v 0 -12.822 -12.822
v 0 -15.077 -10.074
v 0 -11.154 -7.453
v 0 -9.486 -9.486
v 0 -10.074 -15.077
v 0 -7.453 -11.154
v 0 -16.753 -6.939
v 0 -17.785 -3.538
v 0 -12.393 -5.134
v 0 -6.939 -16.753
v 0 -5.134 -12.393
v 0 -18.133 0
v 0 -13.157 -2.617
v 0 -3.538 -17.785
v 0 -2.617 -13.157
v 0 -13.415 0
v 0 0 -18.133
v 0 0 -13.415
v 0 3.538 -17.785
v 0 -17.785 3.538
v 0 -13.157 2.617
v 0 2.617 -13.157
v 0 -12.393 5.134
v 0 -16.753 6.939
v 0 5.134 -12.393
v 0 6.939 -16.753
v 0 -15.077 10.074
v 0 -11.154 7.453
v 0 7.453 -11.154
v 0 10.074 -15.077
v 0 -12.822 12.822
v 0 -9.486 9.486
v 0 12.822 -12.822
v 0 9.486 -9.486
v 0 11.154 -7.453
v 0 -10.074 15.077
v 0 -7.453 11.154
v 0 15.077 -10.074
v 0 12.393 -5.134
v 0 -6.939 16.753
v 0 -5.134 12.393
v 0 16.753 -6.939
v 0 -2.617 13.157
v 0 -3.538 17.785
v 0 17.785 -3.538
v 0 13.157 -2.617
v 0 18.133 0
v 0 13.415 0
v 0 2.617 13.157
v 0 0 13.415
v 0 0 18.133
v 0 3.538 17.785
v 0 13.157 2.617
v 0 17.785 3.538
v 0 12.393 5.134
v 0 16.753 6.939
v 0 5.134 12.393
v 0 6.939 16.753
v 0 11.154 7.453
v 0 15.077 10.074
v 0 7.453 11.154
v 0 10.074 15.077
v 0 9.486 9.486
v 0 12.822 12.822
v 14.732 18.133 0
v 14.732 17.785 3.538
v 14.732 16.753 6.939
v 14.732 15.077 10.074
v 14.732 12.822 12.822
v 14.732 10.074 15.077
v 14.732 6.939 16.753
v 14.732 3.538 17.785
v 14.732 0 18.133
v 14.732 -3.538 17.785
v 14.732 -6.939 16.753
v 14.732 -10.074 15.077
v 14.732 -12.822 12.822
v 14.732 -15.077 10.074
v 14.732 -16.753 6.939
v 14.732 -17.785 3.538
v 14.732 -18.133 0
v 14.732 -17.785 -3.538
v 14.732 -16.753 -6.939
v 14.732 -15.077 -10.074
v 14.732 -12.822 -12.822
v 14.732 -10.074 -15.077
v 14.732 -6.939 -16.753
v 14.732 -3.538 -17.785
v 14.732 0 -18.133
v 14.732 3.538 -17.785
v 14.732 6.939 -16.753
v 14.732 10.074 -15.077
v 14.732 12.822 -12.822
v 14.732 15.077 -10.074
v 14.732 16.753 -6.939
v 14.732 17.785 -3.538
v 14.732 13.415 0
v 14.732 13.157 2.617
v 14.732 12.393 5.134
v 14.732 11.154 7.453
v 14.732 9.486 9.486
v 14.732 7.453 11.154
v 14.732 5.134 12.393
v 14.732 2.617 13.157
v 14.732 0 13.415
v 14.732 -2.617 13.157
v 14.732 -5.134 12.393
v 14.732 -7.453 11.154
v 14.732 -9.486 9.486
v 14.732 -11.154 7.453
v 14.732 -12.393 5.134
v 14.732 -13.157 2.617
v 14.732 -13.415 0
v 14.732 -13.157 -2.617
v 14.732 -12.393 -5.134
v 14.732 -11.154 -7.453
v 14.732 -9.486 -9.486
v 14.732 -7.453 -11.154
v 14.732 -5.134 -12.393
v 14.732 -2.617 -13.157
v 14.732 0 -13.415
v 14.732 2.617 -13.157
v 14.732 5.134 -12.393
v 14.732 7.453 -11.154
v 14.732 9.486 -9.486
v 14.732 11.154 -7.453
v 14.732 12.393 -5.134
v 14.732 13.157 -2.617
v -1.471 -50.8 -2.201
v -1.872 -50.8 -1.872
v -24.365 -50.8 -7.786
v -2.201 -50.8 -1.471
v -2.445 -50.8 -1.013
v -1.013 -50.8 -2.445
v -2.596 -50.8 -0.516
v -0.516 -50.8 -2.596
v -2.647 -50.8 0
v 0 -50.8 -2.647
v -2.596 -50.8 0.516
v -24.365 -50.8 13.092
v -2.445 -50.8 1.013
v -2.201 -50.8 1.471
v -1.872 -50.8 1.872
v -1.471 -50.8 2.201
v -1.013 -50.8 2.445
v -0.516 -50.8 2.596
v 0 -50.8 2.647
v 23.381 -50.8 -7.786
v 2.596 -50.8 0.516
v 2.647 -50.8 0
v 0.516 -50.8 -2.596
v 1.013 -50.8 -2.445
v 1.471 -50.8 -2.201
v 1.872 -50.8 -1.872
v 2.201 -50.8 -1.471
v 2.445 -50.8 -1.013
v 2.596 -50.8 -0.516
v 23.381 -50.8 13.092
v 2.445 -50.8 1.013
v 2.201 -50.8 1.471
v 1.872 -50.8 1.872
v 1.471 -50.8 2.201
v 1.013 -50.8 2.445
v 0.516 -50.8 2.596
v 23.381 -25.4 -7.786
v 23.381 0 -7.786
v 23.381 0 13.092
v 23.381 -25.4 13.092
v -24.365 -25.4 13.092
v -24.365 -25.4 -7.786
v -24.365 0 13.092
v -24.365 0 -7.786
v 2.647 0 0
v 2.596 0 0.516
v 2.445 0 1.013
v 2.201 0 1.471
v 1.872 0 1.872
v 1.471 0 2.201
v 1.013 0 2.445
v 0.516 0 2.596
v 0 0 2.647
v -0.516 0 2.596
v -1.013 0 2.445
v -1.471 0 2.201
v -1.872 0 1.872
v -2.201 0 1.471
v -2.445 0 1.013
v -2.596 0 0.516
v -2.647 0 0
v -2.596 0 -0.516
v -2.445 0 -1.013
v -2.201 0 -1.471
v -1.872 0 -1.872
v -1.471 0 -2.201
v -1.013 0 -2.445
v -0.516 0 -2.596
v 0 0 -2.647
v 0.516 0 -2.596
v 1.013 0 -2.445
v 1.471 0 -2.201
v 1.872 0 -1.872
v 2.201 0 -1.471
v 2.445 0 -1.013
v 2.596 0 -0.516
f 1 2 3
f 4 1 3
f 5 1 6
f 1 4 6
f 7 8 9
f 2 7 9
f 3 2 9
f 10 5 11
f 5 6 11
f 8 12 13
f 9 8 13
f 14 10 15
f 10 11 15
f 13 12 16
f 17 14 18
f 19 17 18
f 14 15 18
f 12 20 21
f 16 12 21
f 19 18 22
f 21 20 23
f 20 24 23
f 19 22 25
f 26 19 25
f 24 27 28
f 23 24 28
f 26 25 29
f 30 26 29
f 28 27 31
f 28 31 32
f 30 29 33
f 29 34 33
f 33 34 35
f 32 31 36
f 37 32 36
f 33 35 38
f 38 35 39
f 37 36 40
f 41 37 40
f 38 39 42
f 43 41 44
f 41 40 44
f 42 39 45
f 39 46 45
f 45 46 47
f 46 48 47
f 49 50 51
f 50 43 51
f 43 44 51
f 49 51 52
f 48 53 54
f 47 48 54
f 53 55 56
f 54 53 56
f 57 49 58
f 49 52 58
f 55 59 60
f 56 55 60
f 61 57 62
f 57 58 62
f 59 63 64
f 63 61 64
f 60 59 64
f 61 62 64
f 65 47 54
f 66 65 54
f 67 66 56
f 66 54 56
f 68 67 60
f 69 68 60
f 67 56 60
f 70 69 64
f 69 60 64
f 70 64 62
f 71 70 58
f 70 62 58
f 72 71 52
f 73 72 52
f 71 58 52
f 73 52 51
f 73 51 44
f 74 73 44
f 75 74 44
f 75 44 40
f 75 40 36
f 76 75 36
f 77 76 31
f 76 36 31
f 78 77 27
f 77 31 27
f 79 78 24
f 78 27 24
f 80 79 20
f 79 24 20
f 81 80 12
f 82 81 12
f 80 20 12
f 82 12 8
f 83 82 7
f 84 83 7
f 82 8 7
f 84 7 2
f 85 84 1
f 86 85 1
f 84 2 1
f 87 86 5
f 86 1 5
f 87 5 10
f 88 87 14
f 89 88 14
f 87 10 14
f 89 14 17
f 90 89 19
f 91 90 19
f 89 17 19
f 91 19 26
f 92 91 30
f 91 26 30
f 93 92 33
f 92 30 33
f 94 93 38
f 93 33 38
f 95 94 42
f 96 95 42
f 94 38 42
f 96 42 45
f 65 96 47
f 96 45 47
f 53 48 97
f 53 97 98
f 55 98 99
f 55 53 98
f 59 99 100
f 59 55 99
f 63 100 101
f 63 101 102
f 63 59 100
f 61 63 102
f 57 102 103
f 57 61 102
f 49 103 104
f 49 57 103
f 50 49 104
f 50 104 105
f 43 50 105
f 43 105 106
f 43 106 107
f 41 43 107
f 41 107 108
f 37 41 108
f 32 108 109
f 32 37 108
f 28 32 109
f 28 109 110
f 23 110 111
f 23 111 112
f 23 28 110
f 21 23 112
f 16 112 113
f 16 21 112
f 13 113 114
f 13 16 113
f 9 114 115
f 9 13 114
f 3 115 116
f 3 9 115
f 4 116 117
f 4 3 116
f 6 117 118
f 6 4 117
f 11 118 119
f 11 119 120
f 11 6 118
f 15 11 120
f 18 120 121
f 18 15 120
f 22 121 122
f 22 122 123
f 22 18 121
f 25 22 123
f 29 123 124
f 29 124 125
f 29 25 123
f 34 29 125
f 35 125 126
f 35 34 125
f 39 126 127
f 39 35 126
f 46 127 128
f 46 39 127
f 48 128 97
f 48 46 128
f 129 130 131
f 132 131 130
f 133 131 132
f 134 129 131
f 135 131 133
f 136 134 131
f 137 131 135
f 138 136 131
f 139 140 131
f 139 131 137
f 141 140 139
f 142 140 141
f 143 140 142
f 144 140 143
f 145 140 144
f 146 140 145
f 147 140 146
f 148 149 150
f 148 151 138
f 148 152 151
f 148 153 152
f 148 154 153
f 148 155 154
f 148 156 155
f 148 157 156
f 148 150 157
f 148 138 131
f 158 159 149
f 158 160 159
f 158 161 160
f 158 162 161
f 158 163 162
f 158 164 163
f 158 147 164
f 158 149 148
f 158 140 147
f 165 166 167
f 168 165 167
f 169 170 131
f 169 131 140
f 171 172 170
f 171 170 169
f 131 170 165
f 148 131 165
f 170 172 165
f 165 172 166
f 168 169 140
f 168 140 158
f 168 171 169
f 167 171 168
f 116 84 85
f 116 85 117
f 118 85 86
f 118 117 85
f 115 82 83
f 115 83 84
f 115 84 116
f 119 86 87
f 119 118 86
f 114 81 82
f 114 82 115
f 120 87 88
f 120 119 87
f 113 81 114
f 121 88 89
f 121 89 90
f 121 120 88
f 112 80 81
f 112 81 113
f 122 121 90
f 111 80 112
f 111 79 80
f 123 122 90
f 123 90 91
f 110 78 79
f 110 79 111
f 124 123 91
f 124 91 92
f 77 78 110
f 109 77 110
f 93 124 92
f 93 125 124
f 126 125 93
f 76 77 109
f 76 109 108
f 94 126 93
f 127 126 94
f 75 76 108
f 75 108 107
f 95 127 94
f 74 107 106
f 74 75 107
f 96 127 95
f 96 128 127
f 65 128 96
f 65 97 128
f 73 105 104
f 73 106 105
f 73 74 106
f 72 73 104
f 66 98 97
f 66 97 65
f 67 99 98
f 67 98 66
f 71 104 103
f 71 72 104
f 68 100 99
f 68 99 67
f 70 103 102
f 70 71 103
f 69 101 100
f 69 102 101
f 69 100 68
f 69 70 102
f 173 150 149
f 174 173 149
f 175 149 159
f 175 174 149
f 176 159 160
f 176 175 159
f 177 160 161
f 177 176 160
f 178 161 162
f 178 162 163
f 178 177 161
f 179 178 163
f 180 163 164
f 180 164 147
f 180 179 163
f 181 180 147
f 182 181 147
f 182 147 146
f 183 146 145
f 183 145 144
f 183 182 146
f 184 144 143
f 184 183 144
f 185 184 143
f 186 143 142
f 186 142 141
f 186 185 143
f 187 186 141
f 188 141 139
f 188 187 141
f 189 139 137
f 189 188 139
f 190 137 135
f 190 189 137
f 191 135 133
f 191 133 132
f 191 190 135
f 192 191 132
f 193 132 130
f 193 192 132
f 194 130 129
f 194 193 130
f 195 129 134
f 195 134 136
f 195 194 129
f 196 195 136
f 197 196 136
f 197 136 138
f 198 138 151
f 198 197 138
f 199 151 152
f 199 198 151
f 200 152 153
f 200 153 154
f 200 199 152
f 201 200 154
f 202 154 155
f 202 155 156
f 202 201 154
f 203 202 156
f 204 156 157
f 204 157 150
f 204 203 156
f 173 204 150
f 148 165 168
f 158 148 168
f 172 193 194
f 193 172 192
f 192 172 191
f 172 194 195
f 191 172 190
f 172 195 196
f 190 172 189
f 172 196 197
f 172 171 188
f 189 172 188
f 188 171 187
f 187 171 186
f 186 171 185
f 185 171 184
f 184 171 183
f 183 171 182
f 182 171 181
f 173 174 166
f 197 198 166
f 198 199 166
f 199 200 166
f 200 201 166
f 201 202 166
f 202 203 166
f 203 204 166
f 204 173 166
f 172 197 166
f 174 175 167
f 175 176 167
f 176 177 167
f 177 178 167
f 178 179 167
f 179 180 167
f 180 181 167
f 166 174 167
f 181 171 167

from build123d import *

# Parameters (mm, degrees)
F0_R      = 18.132989
F0_R_2    = 13.414617
F1_DEPTH  = 14.732
F2_W      = 47.745362
F2_H      = 20.8779
F2_R      = 2.646886
F3_DEPTH  = 25.4
F3_FACE_W = 47.745362
F3_FACE_H = 20.8779
F3_FACE_R = 2.646886
F4_DEPTH  = 25.4


with BuildPart() as f1:
    # F0 (on Right) → F1 (new body)
    with BuildSketch(Plane.YZ):
        Circle(F0_R)
        Circle(F0_R_2, mode=Mode.SUBTRACT)
    extrude(amount=F1_DEPTH)


with BuildPart() as f3:
    # F2 (on Front) → F3 (new body)
    with BuildSketch(Plane.XZ):
        with Locations((-0.491887, 2.652683)):
            Rectangle(F2_W, F2_H)
        Circle(F2_R, mode=Mode.SUBTRACT)
    extrude(amount=F3_DEPTH)

    # F3_face (on face) → F4 (join)
    with BuildSketch(Plane(origin=(-0.502994, -25.4, 2.712577), x_dir=(1, 0, 0), z_dir=(0, -1, 0))):
        with Locations((0.011106, -0.059894)):
            Rectangle(F3_FACE_W, F3_FACE_H)
        with Locations((0.502994, -2.712577)):
            Circle(F3_FACE_R, mode=Mode.SUBTRACT)
    extrude(amount=F4_DEPTH)


solid = Compound([f1.part, f3.part])
